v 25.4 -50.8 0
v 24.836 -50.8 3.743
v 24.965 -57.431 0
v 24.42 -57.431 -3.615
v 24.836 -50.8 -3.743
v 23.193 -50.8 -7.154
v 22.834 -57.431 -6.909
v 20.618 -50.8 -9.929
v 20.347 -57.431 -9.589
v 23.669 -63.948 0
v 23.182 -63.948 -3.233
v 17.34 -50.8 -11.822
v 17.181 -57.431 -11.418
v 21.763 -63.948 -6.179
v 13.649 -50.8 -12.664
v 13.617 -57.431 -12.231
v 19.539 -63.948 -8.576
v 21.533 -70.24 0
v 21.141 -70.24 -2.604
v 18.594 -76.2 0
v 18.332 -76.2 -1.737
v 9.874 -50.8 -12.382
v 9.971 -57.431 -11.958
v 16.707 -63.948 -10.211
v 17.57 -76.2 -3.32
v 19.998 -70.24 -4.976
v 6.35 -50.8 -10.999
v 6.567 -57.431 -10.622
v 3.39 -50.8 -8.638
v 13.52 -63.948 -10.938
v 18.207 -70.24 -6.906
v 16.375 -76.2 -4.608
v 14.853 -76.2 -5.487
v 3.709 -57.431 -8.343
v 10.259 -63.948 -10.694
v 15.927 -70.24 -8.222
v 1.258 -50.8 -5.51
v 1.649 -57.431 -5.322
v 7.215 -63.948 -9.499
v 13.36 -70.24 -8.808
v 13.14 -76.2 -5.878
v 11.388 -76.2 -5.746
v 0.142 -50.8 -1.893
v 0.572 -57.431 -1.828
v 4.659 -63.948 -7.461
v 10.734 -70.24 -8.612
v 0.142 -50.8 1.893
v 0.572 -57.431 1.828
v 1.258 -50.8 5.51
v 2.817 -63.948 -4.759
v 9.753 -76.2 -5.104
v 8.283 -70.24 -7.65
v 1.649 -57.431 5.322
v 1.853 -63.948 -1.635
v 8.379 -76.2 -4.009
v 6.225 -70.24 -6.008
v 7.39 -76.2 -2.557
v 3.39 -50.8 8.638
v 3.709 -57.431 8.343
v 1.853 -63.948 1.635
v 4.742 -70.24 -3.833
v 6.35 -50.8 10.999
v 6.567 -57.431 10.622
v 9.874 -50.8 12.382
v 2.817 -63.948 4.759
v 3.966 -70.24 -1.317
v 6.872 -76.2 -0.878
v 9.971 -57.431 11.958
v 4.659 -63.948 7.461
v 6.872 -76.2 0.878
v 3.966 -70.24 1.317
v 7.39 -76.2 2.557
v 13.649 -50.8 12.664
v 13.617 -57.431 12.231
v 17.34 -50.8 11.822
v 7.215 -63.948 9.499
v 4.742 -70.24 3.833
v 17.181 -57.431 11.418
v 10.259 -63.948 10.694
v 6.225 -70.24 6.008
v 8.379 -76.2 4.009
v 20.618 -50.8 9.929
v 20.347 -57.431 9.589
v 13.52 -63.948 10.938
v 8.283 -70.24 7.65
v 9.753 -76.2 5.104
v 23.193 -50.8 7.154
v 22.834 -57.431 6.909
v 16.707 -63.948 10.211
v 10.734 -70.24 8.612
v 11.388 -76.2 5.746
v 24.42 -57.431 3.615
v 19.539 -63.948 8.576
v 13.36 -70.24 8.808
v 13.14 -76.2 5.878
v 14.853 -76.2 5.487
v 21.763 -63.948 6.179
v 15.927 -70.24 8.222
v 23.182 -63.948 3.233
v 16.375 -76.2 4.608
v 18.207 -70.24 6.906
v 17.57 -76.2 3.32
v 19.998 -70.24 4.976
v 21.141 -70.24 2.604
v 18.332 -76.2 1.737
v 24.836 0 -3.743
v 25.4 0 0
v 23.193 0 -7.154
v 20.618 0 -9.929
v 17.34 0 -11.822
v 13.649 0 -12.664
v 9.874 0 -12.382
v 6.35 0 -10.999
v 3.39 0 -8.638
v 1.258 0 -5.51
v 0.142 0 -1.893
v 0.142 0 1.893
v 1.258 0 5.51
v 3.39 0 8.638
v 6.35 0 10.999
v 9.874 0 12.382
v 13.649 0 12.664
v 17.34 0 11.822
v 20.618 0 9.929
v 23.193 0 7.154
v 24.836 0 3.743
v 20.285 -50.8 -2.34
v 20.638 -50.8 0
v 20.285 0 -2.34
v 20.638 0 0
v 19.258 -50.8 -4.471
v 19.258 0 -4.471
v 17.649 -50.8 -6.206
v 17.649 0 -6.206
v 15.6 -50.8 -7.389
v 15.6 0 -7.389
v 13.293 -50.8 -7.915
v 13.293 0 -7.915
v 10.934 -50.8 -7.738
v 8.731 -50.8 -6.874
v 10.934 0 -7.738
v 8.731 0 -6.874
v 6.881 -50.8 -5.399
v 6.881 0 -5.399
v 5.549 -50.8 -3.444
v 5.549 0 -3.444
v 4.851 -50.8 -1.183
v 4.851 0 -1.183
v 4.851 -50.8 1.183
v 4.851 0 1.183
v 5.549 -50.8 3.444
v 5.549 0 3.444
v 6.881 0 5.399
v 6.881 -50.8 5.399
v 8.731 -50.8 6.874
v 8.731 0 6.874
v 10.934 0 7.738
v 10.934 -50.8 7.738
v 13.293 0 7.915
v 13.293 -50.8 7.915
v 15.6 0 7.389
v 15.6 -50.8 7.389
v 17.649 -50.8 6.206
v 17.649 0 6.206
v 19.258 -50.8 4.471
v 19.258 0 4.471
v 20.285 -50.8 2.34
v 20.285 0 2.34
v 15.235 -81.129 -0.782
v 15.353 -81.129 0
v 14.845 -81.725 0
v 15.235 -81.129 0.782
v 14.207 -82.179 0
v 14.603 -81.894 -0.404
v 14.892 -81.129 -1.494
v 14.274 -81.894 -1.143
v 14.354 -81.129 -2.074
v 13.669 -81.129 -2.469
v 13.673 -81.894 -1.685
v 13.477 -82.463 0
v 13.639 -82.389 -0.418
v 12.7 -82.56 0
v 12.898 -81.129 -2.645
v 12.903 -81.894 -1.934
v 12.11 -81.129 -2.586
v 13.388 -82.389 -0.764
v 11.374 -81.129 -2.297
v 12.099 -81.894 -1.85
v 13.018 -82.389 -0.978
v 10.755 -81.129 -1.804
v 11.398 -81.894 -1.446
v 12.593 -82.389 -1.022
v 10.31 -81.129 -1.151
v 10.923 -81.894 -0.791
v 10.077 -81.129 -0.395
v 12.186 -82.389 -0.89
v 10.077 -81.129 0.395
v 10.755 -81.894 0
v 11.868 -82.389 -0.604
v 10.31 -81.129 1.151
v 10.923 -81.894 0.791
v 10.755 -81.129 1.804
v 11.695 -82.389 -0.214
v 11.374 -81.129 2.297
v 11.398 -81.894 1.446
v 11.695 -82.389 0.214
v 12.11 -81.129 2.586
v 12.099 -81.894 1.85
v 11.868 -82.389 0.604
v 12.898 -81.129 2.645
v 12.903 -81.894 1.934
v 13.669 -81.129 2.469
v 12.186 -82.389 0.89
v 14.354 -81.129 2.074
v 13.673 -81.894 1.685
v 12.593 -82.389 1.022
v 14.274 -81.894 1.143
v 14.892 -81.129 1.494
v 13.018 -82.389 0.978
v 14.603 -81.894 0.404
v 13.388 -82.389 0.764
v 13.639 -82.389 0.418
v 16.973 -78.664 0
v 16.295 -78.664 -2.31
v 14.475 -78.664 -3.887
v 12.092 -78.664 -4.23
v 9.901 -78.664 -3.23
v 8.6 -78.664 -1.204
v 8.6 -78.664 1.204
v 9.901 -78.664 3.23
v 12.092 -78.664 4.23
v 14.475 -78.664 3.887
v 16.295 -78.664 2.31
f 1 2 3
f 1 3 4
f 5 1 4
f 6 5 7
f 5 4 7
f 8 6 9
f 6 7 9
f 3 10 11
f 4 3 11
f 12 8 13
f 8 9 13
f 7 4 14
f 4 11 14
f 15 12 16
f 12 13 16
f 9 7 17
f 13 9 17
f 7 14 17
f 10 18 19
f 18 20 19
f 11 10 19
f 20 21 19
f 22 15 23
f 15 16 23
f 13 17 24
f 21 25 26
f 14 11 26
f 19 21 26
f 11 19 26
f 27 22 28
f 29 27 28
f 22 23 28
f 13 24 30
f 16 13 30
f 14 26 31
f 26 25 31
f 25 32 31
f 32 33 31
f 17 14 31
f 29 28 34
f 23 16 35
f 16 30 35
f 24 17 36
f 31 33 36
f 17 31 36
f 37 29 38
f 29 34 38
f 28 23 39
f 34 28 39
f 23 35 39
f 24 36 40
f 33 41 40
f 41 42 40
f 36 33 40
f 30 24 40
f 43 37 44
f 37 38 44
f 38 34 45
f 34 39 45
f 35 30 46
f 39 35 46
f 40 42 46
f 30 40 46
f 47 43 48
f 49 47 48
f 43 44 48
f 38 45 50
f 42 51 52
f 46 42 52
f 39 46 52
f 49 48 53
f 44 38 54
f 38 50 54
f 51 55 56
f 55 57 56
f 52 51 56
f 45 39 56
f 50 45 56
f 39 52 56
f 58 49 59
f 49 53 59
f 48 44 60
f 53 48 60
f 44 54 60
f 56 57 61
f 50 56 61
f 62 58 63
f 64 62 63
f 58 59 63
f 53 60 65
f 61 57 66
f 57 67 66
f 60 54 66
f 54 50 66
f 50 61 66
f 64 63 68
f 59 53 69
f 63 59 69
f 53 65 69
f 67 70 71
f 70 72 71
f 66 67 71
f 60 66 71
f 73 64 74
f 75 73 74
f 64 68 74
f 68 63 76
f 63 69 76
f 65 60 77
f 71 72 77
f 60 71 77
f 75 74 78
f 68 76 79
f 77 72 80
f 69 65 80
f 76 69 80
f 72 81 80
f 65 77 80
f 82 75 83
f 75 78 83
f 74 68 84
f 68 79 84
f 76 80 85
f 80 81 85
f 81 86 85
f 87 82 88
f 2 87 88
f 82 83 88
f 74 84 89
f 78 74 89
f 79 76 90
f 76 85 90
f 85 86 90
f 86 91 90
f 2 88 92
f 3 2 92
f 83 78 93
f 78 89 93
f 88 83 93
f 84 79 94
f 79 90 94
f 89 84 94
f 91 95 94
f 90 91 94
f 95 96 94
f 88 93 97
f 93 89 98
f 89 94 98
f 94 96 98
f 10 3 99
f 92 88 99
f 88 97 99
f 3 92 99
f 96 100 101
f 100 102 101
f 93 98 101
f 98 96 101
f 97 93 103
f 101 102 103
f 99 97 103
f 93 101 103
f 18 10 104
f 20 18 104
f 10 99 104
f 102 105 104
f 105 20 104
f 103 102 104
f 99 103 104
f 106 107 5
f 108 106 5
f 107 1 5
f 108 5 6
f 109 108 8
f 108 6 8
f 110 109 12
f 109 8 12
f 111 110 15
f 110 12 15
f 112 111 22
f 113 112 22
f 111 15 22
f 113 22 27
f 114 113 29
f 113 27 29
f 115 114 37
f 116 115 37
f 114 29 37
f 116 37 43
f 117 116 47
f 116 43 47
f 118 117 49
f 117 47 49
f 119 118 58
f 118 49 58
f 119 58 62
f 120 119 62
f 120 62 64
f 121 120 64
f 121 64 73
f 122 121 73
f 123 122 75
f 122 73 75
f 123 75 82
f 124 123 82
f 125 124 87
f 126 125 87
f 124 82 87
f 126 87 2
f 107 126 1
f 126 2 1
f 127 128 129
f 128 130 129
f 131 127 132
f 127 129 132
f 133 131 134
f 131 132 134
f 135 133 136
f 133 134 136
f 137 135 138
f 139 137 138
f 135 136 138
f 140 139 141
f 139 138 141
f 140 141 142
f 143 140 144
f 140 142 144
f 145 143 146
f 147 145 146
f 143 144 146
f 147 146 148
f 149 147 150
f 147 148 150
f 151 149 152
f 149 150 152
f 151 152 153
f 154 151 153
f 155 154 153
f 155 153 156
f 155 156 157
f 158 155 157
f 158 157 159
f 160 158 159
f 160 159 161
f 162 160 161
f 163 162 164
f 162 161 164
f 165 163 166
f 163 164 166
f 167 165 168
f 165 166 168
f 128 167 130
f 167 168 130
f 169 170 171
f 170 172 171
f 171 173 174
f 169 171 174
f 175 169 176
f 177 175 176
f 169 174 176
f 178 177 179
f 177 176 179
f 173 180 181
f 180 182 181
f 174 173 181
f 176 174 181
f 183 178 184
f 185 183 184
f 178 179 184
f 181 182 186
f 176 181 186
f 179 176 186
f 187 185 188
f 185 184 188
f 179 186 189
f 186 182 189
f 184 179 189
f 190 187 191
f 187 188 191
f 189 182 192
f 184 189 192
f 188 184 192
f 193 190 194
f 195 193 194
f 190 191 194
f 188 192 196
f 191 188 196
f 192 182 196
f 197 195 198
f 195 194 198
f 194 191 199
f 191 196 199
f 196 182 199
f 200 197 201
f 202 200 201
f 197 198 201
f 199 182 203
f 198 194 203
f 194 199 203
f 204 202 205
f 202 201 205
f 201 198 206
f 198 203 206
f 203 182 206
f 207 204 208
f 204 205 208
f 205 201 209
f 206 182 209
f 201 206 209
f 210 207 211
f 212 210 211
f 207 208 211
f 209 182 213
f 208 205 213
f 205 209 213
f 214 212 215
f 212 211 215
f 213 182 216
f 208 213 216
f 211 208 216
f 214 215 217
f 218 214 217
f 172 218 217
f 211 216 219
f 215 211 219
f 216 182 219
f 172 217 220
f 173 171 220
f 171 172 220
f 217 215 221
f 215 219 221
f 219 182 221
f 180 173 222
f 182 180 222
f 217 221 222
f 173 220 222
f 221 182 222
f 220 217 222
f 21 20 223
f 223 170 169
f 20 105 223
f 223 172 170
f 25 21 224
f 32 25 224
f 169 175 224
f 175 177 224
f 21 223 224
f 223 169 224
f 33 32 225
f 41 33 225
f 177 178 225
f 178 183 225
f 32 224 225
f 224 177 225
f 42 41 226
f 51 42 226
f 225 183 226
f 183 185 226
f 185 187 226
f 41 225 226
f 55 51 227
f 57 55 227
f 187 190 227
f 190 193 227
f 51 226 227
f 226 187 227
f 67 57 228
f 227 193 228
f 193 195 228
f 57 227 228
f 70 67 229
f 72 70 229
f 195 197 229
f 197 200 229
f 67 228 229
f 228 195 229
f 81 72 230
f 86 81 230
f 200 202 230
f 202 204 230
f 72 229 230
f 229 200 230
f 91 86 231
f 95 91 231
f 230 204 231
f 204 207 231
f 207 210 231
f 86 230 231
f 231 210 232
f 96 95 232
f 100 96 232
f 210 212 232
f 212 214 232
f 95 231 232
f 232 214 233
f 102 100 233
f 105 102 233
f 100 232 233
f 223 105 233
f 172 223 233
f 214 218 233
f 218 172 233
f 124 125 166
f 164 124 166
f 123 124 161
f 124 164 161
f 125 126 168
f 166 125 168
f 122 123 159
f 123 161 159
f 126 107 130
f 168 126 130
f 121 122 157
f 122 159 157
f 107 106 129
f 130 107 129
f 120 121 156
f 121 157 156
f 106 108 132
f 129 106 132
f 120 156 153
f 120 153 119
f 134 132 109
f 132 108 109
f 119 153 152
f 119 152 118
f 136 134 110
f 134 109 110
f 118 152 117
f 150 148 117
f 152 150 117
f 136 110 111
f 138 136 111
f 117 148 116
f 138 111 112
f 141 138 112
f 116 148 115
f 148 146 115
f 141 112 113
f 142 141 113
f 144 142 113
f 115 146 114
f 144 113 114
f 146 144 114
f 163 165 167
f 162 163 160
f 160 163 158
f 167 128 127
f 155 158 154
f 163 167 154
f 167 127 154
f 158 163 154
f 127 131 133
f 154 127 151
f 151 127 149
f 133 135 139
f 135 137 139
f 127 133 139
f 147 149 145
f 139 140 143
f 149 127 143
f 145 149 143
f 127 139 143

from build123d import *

# Parameters (mm, degrees)
CUT_EXTRUDE1_DEPTH      = 90.050468029
CUT_EXTRUDE1_DEPTH_BACK = 90.050468029
SKETCH3_W               = 27.181091561
SKETCH3_H               = 38.454465552


# Read off the part's stored shape, not the designer's step: Shell2
with BuildPart() as part:
    # Sketch1 → Revolve1 (revolve)
    with BuildSketch(Plane.XY, mode=Mode.PRIVATE) as revolve1_sk:
        with BuildLine():
            Line((0, 0), (0, -50.8))
            ThreePointArc((0, -50.8), (3.280951188, -68.760512242), (12.7, -84.401041651))
            Line((12.7, -84.401041651), (12.7, 0))
            Line((12.7, 0), (0, 0))
        make_face()
    revolve(revolve1_sk.sketch.rotate(Axis((12.7, -84.401041651, 0), (0, 1, 0)), 180), axis=Axis((12.7, -84.401041651, 0), (0, 1, 0)))

    # Shell2 outline → Shell2 (revolve, cut)
    with BuildSketch(Plane(origin=(12.7, 0, 0), x_dir=(1, 0, 0), z_dir=(0, 0, 1))):
        with BuildLine():
            Line((0, 0), (0, -76.642627696))
            add(Edge.make_bspline(
                [(7.9375, -50.8), (7.9375, -64.940305721), (0, -76.642627696)],
                knots=[0, 0, 0, 0.596002439, 0.596002439, 0.596002439], degree=2, weights=[1, 0.95592526, 1]))
            Line((7.9375, -50.8), (7.9375, 0))
            Line((7.9375, 0), (0, 0))
        make_face()
    revolve(axis=Axis((12.7, 0, 0), (0, 1, 0)), mode=Mode.SUBTRACT)

    # Sketch3 → Cut-Extrude1 (cut, two sides: drawn at the far end of the back side and taken through both)
    with BuildSketch(Plane.XY.offset(-CUT_EXTRUDE1_DEPTH_BACK)):
        with Locations((13.590545781, -70.027232776)):
            Rectangle(SKETCH3_W, SKETCH3_H)
    extrude(amount=CUT_EXTRUDE1_DEPTH + CUT_EXTRUDE1_DEPTH_BACK, mode=Mode.SUBTRACT)

    # Sketch2 → Revolve3 (revolve)
    with BuildSketch(Plane.XY, mode=Mode.PRIVATE) as revolve3_sk:
        with BuildLine():
            Line((12.7, -82.559521115), (12.7, -50.8))
            Line((12.7, -50.8), (0, -50.8))
            ThreePointArc((0, -50.8), (1.730968025, -63.948007491), (6.805909488, -76.2))
            Line((6.805909488, -76.2), (10.047183612, -81.128995309))
            ThreePointArc((10.047183612, -81.128995309), (11.193029623, -82.179098952), (12.7, -82.559521115))
        make_face()
    revolve(revolve3_sk.sketch.rotate(Axis((12.7, -82.559521115, 0), (0, 1, 0)), 180), axis=Axis((12.7, -82.559521115, 0), (0, 1, 0)))


solid = part.part
